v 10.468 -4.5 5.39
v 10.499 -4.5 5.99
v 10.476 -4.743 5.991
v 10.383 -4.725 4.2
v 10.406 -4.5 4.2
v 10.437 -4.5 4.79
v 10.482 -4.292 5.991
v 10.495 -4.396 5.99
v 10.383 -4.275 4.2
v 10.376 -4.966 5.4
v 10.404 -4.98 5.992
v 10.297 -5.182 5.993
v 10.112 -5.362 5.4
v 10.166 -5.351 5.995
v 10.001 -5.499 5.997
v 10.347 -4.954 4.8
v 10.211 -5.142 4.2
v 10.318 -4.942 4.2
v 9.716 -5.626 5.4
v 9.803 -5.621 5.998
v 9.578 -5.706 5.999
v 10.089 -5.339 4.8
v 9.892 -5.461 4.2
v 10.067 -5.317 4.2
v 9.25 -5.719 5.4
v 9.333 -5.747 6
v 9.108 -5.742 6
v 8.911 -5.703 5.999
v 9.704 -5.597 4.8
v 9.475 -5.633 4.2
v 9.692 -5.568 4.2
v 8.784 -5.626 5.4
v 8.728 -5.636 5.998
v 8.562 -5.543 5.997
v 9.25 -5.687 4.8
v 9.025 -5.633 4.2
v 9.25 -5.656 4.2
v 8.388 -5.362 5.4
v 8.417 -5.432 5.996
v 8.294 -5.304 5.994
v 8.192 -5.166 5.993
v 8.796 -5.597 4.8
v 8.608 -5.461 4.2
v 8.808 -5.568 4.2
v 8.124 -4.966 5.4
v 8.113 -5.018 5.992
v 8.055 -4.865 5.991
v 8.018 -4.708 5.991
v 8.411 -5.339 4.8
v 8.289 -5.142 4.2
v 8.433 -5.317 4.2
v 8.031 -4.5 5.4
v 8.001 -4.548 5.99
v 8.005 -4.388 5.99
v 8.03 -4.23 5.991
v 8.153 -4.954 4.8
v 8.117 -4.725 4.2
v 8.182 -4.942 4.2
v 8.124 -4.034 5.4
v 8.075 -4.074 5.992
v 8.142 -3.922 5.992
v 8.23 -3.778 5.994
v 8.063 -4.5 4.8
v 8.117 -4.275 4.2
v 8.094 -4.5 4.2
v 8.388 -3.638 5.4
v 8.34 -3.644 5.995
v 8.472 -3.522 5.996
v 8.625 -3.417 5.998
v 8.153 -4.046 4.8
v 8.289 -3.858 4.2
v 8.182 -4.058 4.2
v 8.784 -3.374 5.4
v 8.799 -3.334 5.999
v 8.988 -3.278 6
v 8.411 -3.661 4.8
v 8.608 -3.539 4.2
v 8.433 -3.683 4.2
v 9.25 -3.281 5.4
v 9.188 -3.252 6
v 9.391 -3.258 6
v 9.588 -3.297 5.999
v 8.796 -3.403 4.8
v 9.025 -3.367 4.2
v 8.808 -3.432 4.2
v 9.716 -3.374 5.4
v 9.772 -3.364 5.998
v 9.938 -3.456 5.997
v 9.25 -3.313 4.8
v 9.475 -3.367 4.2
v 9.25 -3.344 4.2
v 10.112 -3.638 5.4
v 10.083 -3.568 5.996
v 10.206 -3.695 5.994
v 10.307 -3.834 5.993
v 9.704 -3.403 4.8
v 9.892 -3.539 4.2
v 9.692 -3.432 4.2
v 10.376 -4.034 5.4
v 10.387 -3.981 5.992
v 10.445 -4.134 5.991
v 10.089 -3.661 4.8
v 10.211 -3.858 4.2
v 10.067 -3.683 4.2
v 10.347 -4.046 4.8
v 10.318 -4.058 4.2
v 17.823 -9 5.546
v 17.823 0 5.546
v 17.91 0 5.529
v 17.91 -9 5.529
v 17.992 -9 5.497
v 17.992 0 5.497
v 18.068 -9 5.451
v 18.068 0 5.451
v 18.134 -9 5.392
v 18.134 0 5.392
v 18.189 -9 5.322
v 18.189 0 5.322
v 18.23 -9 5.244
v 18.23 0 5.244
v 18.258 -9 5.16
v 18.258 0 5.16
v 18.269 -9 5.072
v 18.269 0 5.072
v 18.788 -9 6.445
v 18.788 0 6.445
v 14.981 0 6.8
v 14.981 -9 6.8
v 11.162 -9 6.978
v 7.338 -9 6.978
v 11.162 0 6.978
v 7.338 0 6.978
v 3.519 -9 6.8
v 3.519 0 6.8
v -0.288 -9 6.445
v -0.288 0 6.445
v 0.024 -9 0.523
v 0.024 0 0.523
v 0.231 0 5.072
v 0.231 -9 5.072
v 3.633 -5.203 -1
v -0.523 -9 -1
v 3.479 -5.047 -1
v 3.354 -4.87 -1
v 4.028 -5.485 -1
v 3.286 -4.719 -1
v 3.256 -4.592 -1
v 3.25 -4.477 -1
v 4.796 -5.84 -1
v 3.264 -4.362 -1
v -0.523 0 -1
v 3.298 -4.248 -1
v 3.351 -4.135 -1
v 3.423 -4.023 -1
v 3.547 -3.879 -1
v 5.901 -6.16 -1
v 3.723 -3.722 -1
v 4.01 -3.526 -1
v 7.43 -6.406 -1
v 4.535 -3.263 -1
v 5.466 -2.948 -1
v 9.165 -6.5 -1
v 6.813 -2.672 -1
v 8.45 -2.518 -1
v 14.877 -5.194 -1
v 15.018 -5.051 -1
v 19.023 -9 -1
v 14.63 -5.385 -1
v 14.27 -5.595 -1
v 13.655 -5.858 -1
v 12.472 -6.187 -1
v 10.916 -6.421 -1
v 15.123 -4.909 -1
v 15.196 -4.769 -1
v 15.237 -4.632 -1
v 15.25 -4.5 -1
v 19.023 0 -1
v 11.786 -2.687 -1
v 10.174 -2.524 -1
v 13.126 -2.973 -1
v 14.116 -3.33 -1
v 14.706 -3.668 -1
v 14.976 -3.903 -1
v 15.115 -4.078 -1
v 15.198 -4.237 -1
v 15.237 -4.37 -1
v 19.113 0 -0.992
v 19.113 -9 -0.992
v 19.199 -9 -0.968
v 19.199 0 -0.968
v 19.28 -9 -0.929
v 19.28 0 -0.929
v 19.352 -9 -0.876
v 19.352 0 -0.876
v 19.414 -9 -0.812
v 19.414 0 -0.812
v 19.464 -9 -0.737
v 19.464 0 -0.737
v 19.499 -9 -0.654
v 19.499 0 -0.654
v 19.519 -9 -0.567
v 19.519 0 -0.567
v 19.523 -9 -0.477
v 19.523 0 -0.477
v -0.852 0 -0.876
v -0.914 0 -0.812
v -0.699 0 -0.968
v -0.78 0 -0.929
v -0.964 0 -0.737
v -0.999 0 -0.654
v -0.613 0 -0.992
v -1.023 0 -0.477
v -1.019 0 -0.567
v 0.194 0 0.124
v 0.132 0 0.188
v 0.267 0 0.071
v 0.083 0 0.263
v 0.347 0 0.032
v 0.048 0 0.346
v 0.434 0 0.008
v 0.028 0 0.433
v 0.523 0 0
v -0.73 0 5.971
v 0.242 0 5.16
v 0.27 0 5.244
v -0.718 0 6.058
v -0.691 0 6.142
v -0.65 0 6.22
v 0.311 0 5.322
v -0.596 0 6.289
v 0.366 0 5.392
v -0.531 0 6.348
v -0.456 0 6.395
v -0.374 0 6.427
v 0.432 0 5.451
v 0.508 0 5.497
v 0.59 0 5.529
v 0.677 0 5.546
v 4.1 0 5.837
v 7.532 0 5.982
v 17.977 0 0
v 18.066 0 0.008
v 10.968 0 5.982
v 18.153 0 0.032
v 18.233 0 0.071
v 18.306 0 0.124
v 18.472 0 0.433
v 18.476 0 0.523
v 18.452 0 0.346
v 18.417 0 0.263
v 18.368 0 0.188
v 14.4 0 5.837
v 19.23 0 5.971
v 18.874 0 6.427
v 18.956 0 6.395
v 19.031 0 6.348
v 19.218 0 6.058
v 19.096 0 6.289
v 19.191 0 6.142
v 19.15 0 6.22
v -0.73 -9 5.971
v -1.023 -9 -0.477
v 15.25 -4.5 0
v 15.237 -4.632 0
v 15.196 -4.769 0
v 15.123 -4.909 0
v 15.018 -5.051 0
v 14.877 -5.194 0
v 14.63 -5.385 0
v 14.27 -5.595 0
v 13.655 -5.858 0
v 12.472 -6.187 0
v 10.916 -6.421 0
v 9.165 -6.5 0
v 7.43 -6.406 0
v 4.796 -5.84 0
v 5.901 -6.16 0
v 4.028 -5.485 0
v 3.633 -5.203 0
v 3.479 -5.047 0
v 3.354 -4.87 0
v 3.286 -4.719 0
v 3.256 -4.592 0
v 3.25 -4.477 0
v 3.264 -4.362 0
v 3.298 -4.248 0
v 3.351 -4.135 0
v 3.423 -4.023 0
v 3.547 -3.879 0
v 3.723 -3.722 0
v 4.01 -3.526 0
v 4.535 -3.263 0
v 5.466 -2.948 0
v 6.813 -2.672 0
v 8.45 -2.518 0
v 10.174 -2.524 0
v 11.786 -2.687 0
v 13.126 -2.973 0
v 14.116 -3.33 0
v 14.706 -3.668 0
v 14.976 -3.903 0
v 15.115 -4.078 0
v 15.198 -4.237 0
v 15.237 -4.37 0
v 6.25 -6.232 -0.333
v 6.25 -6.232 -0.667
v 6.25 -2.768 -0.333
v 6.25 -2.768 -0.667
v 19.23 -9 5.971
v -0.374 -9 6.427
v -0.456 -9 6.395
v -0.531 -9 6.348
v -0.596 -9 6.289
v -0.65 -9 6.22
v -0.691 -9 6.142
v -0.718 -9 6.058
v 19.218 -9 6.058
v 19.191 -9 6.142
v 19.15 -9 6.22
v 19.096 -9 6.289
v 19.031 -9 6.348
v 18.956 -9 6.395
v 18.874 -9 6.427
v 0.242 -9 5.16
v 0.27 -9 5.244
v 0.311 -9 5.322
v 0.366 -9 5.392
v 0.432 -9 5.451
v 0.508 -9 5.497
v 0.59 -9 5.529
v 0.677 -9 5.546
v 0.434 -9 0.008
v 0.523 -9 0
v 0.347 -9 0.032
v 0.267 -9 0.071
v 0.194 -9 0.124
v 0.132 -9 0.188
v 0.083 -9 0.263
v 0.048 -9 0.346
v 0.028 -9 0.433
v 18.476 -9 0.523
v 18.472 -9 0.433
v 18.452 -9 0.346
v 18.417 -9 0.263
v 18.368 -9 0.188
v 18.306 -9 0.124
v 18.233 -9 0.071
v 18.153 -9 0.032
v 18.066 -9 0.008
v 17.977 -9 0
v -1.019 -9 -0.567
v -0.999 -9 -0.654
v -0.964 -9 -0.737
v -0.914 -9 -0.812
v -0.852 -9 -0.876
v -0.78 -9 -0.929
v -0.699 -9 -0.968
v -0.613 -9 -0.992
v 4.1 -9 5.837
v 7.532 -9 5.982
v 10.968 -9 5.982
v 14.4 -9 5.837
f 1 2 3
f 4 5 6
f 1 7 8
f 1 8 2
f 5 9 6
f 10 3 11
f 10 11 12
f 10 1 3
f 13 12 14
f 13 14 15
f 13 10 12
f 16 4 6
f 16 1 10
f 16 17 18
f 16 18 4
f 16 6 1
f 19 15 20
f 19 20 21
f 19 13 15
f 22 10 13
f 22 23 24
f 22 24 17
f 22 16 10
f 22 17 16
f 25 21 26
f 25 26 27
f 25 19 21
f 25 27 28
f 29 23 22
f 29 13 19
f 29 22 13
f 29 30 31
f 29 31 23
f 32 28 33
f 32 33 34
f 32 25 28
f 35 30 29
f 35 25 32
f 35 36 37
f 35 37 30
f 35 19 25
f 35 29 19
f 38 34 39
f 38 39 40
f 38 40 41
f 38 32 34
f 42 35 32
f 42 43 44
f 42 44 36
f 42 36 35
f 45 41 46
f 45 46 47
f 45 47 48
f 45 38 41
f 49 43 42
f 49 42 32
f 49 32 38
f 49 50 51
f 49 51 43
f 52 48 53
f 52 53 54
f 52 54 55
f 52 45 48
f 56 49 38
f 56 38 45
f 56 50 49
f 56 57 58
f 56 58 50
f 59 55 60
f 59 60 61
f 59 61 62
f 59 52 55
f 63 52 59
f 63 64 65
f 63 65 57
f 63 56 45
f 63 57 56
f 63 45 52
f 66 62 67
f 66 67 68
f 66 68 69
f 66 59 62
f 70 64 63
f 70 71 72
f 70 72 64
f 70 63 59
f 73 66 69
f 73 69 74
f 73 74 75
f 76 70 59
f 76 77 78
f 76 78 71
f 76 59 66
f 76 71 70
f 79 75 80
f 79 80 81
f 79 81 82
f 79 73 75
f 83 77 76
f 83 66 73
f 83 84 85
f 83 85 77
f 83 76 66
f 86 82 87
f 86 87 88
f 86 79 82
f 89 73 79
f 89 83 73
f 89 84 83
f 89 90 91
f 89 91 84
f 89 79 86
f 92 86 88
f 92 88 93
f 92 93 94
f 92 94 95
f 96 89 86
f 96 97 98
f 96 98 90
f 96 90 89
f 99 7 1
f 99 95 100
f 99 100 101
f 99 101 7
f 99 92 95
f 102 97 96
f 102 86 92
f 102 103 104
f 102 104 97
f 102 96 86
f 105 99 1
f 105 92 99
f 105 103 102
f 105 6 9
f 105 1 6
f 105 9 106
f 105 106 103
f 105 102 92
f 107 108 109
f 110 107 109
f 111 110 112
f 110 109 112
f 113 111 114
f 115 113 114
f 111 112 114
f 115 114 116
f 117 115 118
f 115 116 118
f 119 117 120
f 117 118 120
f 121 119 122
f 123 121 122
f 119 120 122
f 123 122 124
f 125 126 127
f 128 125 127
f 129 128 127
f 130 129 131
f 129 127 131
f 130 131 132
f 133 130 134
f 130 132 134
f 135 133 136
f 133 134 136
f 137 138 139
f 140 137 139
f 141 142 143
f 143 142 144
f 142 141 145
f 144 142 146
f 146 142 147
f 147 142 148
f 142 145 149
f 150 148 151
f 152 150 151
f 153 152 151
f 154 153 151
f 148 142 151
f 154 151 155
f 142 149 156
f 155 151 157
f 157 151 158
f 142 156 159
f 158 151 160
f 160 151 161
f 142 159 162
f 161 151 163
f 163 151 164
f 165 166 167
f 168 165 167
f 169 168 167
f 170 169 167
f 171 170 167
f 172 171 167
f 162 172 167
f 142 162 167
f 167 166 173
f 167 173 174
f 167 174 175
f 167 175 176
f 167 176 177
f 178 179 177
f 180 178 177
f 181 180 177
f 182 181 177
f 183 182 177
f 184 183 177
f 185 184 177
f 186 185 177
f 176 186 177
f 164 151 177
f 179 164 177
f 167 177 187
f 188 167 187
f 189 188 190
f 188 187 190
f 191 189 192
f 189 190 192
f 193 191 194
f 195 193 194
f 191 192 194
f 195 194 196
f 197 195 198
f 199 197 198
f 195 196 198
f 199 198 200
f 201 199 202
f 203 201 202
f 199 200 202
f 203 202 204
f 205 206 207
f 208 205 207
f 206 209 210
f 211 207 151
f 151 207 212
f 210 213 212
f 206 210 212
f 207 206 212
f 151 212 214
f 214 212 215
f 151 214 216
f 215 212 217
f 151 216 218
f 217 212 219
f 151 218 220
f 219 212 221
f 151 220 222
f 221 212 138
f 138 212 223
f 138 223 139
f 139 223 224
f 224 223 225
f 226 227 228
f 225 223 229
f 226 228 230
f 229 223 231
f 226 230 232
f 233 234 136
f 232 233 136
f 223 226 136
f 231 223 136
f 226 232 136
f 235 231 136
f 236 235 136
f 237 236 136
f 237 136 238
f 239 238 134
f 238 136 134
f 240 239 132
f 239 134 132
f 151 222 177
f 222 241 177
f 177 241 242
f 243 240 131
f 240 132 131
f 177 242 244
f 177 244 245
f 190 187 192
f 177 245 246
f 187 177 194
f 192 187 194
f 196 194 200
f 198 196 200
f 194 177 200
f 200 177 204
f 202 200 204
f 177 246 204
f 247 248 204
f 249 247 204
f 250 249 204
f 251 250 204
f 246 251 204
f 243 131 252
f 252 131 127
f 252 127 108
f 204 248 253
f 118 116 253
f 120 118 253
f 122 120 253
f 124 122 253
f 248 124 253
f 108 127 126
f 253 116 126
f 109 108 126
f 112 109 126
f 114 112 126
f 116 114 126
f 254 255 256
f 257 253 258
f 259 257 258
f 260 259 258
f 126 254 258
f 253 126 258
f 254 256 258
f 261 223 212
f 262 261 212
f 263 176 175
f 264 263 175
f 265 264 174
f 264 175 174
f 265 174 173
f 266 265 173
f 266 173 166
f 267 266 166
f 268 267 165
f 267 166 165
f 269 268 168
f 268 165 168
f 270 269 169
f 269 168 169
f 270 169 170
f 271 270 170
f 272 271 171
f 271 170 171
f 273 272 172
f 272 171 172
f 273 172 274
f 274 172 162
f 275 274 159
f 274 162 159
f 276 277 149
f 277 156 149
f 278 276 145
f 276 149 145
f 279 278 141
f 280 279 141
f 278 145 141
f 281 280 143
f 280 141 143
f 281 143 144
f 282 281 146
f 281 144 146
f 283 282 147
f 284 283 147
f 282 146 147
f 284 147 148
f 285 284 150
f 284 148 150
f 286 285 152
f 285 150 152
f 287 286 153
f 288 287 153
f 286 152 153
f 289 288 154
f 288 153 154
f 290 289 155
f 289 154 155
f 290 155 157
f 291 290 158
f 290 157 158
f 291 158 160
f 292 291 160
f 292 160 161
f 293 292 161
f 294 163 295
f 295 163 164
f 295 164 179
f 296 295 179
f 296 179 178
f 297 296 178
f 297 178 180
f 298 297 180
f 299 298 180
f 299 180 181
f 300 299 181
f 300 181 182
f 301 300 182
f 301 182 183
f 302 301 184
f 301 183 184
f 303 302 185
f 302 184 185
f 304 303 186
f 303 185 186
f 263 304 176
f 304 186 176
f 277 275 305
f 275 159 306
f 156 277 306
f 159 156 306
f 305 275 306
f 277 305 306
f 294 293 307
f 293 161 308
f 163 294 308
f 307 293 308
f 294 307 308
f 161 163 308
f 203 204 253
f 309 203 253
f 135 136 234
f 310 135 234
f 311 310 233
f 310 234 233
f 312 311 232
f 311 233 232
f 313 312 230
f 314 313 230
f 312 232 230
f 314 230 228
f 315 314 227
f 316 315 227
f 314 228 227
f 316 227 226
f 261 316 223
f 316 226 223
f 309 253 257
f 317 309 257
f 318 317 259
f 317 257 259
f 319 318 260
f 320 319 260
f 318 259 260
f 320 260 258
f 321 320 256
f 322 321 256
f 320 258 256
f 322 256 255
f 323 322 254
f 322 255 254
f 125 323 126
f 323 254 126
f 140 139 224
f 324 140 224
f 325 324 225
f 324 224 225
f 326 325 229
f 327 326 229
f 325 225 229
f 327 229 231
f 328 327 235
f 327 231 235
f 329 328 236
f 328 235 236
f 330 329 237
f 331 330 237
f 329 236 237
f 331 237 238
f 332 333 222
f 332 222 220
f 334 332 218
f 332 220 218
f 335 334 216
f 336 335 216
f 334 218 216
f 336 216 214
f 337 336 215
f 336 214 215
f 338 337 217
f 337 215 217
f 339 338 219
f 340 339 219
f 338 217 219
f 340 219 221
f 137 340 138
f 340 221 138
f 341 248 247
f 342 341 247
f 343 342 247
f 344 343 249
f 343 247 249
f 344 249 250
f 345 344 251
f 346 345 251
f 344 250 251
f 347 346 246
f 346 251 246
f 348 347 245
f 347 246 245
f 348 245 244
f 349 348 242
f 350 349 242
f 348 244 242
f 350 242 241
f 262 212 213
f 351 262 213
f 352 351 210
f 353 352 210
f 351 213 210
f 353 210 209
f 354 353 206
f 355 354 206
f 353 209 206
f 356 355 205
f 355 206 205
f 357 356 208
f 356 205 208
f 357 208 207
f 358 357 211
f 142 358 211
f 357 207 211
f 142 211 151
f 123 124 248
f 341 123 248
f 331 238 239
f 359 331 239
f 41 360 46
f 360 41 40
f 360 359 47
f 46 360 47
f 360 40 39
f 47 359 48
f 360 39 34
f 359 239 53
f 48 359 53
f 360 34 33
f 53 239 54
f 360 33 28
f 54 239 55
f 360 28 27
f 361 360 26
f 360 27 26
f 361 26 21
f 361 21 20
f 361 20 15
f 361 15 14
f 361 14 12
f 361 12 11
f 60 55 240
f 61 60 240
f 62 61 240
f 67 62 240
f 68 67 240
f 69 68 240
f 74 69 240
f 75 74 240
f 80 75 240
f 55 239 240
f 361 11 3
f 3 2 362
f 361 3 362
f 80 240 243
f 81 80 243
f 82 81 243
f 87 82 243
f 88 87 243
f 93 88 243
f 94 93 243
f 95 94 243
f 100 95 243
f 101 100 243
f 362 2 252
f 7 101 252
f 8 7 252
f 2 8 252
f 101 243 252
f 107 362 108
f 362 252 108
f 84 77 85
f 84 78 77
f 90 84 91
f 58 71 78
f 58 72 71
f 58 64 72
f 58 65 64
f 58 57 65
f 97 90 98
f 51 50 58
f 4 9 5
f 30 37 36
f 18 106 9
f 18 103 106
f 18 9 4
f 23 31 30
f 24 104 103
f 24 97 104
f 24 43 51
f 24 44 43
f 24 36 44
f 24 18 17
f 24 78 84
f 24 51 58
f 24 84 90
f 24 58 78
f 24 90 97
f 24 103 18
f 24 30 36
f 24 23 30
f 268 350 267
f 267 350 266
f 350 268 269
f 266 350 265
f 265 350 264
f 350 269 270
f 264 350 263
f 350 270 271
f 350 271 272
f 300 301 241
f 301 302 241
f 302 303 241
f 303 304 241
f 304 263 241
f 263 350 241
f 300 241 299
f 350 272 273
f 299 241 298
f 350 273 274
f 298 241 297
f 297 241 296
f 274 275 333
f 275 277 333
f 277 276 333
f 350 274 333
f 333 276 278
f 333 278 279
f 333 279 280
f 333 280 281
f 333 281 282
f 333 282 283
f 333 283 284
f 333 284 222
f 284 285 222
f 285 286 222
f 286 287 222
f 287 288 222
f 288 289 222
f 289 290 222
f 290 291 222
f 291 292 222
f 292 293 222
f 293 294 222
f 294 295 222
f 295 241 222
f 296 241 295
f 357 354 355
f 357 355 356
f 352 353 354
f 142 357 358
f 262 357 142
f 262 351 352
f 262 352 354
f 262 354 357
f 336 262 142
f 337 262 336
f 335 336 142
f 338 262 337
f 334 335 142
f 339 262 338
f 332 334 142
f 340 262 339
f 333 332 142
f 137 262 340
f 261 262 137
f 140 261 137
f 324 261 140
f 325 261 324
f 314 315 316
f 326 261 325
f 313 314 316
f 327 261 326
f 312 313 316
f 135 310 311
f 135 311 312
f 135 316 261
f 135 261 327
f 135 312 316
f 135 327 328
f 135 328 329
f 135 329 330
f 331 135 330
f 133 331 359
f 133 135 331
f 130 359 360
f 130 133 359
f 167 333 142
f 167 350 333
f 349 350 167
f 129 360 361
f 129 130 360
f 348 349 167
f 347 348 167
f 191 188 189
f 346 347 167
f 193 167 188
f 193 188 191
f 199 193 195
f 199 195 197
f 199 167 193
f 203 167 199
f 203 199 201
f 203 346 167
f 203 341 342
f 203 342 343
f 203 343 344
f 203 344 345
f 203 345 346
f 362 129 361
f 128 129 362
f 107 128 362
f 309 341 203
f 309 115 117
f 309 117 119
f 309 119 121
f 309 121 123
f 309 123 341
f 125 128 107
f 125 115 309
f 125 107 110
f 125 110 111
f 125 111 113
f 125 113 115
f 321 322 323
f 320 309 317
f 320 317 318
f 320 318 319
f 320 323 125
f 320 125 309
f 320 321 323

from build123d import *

# Parameters (mm, degrees)
F1_DEPTH = 9
F3_DEPTH = 1
F5_R     = 1.25
F6_DEPTH = 1.8
F6_TAPER = 3


with BuildPart() as f1:
    # F0 (on Front) → F1 (new body)
    with BuildSketch(Plane.XZ):
        with BuildLine():
            ThreePointArc((19.2296160725, 5.9711619501), (19.095977397, 6.2892762544), (18.7881142599, 6.4450847748))
            ThreePointArc((18.7881142599, 6.4450847748), (9.25, 7), (-0.2881142599, 6.4450847748))
            ThreePointArc((-0.2881142599, 6.4450847748), (-0.595977397, 6.2892762544), (-0.7296160725, 5.9711619501))
            Line((-0.7296160725, 5.9711619501), (-1.0227278052, -0.4772961695))
            ThreePointArc((-1.0227278052, -0.4772961695), (-0.8847348319, -0.8454331229), (-0.5232435351, -1))
            Line((-0.5232435351, -1), (19.0232435351, -1))
            ThreePointArc((19.0232435351, -1), (19.3847348319, -0.8454331229), (19.5227278052, -0.4772961695))
            Line((19.5227278052, -0.4772961695), (19.2296160725, 5.9711619501))
        make_face()
        with BuildLine():
            ThreePointArc((0.5232435351, 0), (0.1617522384, 0.1545668771), (0.023759265, 0.5227038305))
            Line((0.023759265, 0.5227038305), (0.2305442149, 5.0719727274))
            ThreePointArc((0.2305442149, 5.0719727274), (0.3659805058, 5.3920065063), (0.6772732434, 5.5464779923))
            ThreePointArc((0.6772732434, 5.5464779923), (9.25, 6), (17.8227267566, 5.5464779923))
            ThreePointArc((17.8227267566, 5.5464779923), (18.1340194942, 5.3920065063), (18.2694557851, 5.0719727274))
            Line((18.2694557851, 5.0719727274), (18.476240735, 0.5227038305))
            ThreePointArc((18.476240735, 0.5227038305), (18.3382477616, 0.1545668771), (17.9767564649, 0))
            Line((17.9767564649, 0), (0.5232435351, 0))
        make_face(mode=Mode.SUBTRACT)
    extrude(amount=F1_DEPTH)

    # F2 (on face) → F3 (cut, through all)
    with BuildSketch(Plane(origin=(0, 0, -1), x_dir=(1, 0, 0), z_dir=(0, 0, -1))):
        with BuildLine():
            add(Edge.make_bspline(
                [(15.25, 4.5), (15.25, 7.9641016151), (6.25, 6.2320508076), (-2.75, 4.5), (6.25, 2.7679491924), (15.25, 1.0358983849), (15.25, 4.5)],
                knots=[0, 0, 0, 2.0943951024, 2.0943951024, 4.1887902048, 4.1887902048, 6.2831853072, 6.2831853072, 6.2831853072], degree=2, weights=[1, 0.5, 1, 0.5, 1, 0.5, 1]))
        make_face()
    extrude(amount=-F3_DEPTH, mode=Mode.SUBTRACT)

    # F5 (on offset) → F6 (join)
    with BuildSketch(Plane(origin=(0, 0, 6), x_dir=(1, 0, 0), z_dir=(0, 0, -1))):
        with Locations((9.25, 4.5)):
            Circle(F5_R)
    extrude(amount=F6_DEPTH, taper=F6_TAPER)


solid = f1.part
